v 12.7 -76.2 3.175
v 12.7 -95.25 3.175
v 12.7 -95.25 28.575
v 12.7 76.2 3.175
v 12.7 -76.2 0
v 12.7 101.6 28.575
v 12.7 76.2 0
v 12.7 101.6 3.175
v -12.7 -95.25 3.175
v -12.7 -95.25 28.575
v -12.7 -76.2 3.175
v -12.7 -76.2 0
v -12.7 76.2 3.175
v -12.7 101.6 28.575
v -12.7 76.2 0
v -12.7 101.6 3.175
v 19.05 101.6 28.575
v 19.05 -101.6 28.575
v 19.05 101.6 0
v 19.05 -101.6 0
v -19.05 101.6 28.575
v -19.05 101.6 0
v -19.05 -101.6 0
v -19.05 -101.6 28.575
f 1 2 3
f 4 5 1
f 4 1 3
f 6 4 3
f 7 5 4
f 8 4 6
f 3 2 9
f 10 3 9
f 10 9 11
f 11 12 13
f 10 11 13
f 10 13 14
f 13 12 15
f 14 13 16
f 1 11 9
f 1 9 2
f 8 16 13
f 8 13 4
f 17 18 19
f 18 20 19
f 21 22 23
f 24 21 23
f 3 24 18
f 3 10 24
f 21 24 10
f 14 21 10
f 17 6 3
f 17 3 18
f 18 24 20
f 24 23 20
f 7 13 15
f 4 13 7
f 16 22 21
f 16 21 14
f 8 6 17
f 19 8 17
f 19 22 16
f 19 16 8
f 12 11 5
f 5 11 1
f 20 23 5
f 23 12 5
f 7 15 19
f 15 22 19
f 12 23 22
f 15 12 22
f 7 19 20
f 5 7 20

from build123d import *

# Parameters (mm, degrees)
F0_W     = 38.1
F0_H     = 203.2
F1_DEPTH = 3.175
F2_W     = 6.35
F2_H     = 196.85
F2_H_2   = 6.35
F2_W_2   = 25.4
F3_DEPTH = 25.4
F4_W     = 25.4
F4_H     = 152.4
F5_DEPTH = 3.176


with BuildPart() as f1:
    # F0 (on Top) → F1 (new body)
    with BuildSketch(Plane.XY):
        Rectangle(F0_W, F0_H)
    extrude(amount=F1_DEPTH)

    # F2 (on face) → F3 (join)
    with BuildSketch(Plane.XY.offset(3.175)):
        with Locations((-15.875, 3.175)):
            Rectangle(F2_W, F2_H)
        with Locations((-15.875, -98.425)):
            Rectangle(F2_W, F2_H_2)
        with Locations((0, -98.425)):
            Rectangle(F2_W_2, F2_H_2)
        with Locations((15.875, -98.425)):
            Rectangle(F2_W, F2_H_2)
        with Locations((15.875, 3.175)):
            Rectangle(F2_W, F2_H)
    extrude(amount=F3_DEPTH)

    # F4 (on face) → F5 (cut, through all)
    with BuildSketch(Plane.XY.offset(3.175)):
        Rectangle(F4_W, F4_H)
    extrude(amount=-F5_DEPTH, mode=Mode.SUBTRACT)


solid = f1.part
